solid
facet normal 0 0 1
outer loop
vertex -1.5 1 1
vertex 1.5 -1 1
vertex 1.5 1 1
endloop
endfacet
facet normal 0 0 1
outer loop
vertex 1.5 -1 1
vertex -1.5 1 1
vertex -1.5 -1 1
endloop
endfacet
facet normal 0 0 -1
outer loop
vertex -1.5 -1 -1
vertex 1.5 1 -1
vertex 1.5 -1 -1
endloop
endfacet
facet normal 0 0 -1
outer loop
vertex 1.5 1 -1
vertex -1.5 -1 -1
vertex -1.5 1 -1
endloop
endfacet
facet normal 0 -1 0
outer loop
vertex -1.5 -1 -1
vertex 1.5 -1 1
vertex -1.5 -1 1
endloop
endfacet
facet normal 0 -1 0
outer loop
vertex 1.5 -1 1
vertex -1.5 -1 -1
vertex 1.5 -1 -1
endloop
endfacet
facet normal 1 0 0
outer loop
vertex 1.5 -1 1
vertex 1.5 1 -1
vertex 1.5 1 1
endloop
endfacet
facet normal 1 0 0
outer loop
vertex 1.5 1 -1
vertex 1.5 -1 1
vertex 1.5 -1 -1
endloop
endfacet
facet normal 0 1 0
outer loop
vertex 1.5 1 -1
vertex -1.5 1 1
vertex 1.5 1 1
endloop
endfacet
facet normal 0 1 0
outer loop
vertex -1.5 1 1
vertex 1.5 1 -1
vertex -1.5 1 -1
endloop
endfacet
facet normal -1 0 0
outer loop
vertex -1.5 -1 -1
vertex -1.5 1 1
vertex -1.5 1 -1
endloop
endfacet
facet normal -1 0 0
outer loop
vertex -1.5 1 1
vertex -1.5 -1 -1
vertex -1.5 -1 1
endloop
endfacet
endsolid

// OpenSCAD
union() {
    cube(size=[2, 3, 2], center=true);
    !cube(size=[3, 2, 2], center=true);
};
